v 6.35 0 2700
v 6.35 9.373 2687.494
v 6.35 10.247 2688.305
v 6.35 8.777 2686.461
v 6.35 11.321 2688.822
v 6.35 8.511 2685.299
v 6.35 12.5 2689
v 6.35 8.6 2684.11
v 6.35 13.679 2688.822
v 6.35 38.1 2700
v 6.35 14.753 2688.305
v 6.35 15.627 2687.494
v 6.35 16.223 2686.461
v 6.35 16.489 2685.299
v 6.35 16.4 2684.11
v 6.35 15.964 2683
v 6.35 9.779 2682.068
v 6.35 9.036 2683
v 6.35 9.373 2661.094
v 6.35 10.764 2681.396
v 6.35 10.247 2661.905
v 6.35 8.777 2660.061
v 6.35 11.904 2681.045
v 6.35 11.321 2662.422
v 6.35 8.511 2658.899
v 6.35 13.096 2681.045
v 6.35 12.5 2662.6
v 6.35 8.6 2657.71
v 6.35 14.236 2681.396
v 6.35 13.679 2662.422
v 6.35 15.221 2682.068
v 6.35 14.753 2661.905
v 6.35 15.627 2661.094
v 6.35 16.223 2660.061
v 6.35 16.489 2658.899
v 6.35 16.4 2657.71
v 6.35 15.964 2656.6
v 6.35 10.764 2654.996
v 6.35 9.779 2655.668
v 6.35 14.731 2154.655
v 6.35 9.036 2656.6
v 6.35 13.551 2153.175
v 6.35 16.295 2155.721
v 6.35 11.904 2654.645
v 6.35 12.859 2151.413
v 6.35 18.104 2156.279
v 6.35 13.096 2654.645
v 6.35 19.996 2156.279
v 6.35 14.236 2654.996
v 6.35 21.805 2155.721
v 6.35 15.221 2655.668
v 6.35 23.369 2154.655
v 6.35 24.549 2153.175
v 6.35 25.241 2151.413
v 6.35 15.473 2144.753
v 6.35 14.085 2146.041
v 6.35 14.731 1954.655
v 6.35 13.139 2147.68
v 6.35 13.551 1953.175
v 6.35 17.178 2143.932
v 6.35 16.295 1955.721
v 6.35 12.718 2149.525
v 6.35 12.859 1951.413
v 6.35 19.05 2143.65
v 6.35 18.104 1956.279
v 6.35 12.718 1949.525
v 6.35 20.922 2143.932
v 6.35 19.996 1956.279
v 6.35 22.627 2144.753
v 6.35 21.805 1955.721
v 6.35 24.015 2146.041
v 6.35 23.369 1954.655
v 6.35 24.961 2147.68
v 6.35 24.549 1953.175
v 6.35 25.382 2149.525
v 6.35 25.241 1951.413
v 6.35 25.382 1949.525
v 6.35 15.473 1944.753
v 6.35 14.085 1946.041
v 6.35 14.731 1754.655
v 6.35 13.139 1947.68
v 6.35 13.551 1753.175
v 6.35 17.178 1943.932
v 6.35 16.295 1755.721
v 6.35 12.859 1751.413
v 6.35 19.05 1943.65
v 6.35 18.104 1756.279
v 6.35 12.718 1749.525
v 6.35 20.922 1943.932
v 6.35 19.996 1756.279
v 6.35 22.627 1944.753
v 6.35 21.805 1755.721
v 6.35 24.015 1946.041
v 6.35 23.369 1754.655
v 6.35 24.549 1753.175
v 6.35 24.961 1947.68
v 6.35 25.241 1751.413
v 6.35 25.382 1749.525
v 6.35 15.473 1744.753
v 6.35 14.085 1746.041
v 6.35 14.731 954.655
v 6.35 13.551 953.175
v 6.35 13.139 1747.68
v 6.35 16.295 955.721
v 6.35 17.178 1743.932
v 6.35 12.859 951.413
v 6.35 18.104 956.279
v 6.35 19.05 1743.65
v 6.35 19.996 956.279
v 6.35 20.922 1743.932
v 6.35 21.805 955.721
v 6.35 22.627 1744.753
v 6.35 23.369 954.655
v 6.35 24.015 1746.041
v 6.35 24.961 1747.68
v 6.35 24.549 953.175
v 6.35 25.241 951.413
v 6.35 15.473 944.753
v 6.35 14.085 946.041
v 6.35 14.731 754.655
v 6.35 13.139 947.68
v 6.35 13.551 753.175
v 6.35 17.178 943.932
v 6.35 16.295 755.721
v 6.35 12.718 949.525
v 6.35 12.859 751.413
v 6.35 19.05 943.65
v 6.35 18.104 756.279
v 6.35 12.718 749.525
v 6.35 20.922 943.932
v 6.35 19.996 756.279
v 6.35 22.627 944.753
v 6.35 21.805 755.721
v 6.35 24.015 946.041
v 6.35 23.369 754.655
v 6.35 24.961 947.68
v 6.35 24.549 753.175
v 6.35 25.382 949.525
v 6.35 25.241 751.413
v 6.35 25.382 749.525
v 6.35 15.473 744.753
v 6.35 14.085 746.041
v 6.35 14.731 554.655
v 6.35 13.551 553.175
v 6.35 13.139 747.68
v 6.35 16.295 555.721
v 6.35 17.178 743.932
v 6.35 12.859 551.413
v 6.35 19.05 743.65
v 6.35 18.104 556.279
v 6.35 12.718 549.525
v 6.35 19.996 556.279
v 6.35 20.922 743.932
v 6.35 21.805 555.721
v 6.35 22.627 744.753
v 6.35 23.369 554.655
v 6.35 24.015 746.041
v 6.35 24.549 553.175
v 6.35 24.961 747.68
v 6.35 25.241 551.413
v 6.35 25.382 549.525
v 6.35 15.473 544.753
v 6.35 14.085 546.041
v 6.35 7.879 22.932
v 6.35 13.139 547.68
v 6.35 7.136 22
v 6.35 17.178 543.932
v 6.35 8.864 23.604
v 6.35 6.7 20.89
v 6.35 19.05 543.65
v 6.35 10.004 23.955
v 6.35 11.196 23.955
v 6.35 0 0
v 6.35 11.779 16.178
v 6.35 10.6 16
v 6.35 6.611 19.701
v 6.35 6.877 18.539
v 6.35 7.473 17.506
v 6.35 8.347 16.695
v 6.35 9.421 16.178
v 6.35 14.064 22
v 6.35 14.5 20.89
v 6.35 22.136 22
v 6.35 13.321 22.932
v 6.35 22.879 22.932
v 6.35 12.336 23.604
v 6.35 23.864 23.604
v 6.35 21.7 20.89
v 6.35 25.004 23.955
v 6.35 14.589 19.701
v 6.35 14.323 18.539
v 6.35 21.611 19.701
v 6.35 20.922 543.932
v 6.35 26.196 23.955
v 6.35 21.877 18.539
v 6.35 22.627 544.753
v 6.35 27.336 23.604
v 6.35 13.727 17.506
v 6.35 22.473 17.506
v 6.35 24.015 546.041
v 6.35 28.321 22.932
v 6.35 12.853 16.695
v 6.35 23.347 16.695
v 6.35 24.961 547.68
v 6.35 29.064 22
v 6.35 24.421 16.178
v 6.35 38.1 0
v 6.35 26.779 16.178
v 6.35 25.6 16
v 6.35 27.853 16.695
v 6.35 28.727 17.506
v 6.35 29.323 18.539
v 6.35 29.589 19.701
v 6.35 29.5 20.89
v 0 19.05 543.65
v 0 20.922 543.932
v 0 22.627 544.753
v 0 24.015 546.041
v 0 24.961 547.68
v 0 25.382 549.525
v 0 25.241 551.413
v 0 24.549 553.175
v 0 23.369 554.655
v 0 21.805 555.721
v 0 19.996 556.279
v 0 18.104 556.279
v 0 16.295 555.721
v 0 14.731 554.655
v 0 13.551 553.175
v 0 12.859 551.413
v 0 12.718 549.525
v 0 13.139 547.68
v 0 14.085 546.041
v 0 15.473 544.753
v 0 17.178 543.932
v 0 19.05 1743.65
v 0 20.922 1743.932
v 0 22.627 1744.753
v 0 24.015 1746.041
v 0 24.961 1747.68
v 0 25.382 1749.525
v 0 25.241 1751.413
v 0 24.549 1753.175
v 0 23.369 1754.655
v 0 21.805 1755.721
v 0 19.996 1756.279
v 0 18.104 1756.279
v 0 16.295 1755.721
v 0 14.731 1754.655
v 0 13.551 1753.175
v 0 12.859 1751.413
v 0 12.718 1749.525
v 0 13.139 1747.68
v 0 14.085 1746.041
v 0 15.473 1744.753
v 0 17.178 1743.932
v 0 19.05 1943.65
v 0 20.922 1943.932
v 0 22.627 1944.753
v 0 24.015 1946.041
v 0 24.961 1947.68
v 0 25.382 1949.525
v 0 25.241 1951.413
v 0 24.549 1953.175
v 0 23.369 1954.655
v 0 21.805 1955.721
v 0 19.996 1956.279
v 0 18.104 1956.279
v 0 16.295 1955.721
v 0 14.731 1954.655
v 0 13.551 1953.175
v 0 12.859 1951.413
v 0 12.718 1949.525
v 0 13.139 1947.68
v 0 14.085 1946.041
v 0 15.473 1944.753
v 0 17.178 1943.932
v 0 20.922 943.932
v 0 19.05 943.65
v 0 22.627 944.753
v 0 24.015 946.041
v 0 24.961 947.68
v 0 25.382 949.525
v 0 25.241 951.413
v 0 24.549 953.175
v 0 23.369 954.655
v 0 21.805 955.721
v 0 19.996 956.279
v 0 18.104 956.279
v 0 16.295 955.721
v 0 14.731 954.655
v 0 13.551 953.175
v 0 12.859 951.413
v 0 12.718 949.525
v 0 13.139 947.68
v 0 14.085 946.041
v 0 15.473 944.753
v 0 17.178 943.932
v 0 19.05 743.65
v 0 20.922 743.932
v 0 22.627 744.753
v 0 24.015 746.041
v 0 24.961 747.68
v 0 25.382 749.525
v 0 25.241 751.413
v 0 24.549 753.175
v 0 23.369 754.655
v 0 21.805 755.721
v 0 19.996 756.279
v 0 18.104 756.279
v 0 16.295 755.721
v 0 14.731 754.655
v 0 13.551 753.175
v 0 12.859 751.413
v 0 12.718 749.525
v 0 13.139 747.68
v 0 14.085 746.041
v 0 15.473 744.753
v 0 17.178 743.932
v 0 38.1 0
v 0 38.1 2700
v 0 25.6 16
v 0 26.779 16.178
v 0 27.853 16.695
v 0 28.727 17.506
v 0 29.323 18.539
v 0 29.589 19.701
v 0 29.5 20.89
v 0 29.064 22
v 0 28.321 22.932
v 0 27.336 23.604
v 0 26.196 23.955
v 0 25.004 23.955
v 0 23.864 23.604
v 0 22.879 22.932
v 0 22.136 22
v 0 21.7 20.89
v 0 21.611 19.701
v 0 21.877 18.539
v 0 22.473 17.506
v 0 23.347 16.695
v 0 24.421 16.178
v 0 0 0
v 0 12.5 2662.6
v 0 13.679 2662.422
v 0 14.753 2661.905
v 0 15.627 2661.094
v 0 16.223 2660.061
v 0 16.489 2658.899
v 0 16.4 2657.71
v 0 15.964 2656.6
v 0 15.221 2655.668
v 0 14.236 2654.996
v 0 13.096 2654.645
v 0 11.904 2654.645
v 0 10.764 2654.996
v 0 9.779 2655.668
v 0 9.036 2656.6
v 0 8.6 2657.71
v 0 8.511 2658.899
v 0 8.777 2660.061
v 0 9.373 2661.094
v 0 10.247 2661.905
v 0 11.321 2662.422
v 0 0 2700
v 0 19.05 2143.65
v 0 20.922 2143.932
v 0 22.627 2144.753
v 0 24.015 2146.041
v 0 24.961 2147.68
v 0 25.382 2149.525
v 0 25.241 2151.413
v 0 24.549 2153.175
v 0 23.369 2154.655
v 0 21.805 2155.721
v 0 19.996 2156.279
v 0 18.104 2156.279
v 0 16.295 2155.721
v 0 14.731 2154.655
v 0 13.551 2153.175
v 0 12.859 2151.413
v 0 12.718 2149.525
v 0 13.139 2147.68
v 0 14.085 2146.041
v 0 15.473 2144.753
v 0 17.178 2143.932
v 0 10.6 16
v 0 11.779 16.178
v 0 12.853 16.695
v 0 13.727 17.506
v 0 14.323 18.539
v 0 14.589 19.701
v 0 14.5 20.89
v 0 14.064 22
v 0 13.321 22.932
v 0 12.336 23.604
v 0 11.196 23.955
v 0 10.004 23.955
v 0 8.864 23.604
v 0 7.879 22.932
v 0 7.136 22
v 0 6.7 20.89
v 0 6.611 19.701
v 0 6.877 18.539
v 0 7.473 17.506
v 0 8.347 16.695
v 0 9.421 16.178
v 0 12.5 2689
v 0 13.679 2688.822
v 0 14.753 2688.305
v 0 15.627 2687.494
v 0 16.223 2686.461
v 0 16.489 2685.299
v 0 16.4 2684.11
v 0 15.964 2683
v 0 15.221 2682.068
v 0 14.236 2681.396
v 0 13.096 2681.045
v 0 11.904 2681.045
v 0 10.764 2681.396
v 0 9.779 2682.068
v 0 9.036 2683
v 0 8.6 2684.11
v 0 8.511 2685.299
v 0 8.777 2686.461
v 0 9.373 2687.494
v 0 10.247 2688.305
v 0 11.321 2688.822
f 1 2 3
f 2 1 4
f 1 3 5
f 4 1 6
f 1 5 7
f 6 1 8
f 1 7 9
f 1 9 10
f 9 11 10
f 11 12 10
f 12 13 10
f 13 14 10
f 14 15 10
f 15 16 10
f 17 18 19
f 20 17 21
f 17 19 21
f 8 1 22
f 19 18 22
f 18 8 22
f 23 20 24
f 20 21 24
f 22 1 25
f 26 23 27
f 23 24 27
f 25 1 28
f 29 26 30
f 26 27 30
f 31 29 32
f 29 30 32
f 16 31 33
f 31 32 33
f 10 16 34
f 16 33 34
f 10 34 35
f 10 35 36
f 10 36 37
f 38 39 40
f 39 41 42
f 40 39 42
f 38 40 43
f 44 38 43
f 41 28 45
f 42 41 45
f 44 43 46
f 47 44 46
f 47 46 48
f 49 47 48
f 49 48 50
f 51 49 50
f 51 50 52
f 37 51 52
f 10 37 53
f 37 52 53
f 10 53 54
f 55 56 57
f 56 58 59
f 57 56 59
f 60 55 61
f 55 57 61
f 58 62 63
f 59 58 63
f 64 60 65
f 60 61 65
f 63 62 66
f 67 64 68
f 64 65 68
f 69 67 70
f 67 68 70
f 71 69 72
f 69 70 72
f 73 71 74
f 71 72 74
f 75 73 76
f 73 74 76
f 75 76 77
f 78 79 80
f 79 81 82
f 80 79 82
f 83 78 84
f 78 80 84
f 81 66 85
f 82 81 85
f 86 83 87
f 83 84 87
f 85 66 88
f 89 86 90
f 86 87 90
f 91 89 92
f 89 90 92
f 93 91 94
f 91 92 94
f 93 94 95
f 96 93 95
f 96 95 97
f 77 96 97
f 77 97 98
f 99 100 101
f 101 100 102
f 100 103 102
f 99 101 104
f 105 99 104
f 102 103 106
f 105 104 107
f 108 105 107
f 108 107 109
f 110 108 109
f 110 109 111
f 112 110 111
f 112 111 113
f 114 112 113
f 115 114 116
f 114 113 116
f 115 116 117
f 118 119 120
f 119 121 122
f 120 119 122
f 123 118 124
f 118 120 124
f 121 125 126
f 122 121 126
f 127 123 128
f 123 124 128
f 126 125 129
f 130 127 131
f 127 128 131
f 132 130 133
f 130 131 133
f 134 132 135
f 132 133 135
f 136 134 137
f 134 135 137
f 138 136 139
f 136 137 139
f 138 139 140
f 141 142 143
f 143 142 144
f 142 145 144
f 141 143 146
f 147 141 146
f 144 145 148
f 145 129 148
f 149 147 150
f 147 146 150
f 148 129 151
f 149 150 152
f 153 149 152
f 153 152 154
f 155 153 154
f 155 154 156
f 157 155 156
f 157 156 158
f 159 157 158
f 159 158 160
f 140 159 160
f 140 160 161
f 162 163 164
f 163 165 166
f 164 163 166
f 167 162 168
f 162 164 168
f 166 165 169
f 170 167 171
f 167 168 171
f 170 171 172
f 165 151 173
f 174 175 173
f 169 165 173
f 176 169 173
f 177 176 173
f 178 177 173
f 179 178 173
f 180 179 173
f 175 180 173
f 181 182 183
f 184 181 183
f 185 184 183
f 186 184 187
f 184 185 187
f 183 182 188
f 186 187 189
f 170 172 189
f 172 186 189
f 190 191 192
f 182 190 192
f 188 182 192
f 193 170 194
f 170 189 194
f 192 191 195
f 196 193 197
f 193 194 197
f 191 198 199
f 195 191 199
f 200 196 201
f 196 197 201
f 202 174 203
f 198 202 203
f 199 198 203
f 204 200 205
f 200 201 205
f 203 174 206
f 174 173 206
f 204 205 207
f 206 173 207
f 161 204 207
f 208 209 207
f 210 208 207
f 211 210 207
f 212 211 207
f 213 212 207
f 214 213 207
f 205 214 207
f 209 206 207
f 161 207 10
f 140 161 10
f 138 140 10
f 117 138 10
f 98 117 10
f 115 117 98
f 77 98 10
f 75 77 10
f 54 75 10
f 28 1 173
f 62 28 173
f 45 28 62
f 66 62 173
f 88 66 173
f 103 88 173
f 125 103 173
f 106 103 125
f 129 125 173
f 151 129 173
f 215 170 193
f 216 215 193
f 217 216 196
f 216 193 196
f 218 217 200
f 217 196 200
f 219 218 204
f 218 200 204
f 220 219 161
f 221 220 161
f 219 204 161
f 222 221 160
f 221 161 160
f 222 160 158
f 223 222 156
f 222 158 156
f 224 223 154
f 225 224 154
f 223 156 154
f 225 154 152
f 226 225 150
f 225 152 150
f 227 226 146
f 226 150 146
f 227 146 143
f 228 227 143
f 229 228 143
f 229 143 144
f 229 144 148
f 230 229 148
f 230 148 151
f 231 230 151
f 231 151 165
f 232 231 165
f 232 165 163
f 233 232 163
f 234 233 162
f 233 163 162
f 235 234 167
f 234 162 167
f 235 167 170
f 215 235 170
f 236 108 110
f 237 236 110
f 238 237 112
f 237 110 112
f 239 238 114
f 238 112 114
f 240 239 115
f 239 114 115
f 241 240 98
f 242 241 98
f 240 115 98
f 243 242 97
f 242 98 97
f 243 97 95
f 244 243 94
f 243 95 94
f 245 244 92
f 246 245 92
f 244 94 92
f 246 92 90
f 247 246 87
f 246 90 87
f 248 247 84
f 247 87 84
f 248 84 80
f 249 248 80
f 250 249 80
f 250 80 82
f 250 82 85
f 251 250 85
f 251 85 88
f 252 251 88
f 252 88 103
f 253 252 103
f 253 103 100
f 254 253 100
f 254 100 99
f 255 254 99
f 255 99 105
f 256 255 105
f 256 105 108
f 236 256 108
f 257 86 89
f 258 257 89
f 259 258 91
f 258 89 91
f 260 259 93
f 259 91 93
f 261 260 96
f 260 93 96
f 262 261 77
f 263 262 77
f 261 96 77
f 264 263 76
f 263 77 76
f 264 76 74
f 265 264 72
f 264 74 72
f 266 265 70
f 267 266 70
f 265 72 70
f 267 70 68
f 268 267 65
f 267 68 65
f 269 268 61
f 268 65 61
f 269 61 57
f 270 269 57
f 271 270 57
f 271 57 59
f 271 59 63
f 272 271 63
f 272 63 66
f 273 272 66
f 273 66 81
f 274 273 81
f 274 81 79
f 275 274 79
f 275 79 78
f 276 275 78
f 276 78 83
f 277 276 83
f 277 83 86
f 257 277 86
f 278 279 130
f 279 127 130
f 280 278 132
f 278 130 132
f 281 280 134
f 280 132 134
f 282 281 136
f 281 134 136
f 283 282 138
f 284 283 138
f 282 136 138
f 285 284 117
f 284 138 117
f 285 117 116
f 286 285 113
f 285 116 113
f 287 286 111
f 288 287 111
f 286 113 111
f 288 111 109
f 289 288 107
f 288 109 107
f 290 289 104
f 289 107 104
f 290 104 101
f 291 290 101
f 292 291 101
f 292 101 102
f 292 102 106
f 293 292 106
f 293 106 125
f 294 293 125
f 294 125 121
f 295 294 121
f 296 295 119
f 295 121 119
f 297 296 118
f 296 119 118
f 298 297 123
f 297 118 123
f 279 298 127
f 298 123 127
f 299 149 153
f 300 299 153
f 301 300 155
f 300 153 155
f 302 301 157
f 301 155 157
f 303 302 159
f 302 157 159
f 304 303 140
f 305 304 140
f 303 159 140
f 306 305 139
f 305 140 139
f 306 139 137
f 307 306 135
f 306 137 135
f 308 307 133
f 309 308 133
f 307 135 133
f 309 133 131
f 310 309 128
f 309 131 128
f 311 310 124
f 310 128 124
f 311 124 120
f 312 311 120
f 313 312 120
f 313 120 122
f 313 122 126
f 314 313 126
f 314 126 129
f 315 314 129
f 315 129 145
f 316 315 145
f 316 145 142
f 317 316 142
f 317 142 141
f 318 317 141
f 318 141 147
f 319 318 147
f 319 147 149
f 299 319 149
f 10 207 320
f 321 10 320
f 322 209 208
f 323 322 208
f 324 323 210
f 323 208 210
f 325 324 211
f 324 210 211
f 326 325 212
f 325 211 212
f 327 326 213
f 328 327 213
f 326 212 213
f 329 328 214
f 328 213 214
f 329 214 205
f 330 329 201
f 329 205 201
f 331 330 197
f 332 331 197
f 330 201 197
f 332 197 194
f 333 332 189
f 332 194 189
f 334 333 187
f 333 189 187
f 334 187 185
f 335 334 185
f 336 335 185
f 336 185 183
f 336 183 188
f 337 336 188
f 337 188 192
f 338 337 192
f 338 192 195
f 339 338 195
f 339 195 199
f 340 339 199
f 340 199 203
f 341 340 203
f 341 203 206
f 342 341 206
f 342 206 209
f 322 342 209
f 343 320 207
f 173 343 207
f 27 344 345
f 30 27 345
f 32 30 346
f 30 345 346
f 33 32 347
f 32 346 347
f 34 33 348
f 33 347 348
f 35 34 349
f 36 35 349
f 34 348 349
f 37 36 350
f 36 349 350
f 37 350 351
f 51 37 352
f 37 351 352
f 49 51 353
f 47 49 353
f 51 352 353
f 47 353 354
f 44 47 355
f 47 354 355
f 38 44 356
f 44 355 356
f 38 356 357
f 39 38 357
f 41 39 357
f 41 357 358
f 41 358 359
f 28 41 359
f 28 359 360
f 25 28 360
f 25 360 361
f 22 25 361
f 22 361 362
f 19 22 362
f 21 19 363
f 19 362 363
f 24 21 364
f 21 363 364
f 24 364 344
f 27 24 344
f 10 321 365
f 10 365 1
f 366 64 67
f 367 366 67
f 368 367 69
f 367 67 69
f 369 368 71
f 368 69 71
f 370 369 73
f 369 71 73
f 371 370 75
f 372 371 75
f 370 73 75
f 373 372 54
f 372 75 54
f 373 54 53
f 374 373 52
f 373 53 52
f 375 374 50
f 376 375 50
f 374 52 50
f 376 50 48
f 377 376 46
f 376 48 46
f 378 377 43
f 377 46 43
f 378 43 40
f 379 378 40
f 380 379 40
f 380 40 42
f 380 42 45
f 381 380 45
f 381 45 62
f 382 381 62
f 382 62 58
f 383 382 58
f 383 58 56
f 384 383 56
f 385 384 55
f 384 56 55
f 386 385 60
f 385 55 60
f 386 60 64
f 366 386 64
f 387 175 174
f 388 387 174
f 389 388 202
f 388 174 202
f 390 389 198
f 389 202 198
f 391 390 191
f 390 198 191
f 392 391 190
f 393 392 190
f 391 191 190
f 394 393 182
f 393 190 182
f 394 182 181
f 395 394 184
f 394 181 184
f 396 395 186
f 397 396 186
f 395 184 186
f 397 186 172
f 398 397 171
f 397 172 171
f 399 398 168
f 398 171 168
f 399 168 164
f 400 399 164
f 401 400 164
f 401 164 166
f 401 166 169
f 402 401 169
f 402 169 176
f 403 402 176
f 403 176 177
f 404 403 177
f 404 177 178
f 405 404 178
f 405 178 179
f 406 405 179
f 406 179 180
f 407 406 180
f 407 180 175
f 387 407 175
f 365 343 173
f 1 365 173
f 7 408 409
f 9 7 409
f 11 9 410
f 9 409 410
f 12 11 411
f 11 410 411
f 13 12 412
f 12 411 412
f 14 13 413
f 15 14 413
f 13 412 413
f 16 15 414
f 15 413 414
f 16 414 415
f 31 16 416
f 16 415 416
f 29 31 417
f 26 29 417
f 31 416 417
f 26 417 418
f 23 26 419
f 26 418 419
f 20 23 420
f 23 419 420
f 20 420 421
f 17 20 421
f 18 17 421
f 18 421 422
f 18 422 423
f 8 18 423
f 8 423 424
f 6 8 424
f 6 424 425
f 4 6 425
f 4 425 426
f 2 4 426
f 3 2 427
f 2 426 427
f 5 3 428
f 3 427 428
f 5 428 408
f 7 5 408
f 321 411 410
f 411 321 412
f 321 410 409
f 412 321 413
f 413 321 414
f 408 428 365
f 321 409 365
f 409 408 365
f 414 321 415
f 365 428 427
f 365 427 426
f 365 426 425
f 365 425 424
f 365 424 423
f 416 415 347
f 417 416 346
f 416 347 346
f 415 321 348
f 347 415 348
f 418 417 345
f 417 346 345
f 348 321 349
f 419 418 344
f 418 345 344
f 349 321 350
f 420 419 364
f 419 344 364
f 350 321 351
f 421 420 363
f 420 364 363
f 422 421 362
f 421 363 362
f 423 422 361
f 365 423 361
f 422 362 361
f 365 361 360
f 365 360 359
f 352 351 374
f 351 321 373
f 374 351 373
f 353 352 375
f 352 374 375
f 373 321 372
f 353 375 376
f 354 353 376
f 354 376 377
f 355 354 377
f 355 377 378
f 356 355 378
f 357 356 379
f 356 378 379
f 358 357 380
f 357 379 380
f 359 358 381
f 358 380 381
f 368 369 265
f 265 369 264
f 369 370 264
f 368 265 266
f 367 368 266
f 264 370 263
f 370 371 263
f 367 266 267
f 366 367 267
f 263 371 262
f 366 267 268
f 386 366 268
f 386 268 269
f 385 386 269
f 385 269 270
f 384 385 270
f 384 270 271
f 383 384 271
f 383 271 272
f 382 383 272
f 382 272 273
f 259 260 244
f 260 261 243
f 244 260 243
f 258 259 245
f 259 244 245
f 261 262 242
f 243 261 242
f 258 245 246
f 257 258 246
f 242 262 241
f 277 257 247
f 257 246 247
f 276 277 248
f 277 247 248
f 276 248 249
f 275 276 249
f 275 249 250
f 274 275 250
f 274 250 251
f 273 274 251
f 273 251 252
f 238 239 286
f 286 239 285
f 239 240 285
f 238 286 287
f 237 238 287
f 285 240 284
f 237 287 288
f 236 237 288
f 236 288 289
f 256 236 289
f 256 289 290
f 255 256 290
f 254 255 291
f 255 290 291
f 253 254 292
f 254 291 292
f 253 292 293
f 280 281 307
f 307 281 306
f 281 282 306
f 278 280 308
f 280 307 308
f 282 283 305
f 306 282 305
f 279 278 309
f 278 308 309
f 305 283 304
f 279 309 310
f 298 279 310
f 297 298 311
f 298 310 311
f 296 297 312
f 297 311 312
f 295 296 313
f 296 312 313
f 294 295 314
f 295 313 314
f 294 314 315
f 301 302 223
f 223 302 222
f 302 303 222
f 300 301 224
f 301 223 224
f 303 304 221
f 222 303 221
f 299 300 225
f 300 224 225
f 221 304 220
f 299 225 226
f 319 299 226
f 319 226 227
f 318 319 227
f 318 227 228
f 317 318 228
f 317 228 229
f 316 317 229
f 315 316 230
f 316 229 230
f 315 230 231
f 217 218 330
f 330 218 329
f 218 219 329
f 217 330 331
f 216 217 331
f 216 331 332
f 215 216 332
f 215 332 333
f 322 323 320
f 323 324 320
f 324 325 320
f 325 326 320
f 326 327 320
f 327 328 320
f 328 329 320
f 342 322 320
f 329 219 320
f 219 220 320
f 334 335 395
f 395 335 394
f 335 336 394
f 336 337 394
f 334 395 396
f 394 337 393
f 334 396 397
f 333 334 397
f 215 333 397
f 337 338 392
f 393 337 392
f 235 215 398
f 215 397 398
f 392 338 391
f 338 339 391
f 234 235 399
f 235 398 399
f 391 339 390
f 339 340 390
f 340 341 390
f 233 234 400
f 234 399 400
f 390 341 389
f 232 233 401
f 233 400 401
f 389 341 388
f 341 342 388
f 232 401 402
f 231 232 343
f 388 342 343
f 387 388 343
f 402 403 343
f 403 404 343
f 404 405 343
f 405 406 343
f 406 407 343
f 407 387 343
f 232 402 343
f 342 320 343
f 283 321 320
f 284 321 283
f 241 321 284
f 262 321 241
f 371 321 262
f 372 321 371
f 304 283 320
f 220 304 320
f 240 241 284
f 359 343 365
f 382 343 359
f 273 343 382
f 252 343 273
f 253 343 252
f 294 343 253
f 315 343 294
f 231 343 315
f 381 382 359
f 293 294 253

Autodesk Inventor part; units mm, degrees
ref_plane "YZ Plane" through (0, 0, 0) normal (1, 0, 0) x (0, 1, 0)
ref_plane "XZ Plane" through (0, 0, 0) normal (0, 1, 0) x (-1, 0, 0)
ref_plane "XY Plane" through (0, 0, 0) normal (0, 0, 1) x (1, 0, 0)
sketch "Sketch1" plane through (0, 0, 0) normal (0, 0, 1) x (1, 0, 0)
  line L0 (0, 0) -> (6.35, 0)
  line L1 (6.35, 0) -> (6.35, 38.1)
  line L2 (6.35, 38.1) -> (0, 38.1)
  line L3 (0, 38.1) -> (0, 0)
  dimension "d0" = 6.35
  dimension "d1" = 38.1
extrude "Extrusion1" add sketch "Sketch1" along normal blind 2700
sketch "Sketch2" plane through (6.35, 38.1, 2700) normal (1, 0, 0) x (0, 0, -1)
  line L0 (2700, -38.1) -> (2700, 0) projected
  line L1 (2700, 0) -> (0, 0) projected
  line L2 (0, -38.1) -> (0, 0) projected
  line L3 (2700, -38.1) -> (0, -38.1) projected
  circle A0 centre (550, -19.05) radius 6.35
  circle A1 centre (750, -19.05) radius 6.35
  circle A2 centre (950, -19.05) radius 6.35
  circle A3 centre (1750, -19.05) radius 6.35
  circle A4 centre (1950, -19.05) radius 6.35
  circle A5 centre (2150, -19.05) radius 6.35
  dimension "d4" = 12.7
  dimension "d5" = 19.05
  dimension "d6" = 12.7
  dimension "d7" = 12.7
  dimension "d8" = 12.7
  dimension "d9" = 12.7
  dimension "d10" = 12.7
  dimension "d11" = 550
  dimension "d12" = 200
  dimension "d13" = 200
  dimension "d14" = 550
  dimension "d15" = 200
  dimension "d16" = 200
  dimension "d17" = 19.05
  dimension "d18" = 19.05
  dimension "d19" = 19.05
  dimension "d20" = 19.05
  dimension "d21" = 19.05
extrude "Extrusion3" cut sketch "Sketch2" against normal blind 10 contours A0 | A1 | A2 | A3 | A4 | A5
sketch "Sketch3" plane through (0, 0, 0) normal (-1, 0, 0) x (0, 0, 1)
  circle A0 centre (750, 19.05) radius 6.35 projected
  circle A1 centre (1750, 19.05) radius 6.35 projected
  circle A2 centre (2150, 19.05) radius 6.35 projected
  circle A3 centre (1950, 19.05) radius 6.35 projected
  circle A4 centre (950, 19.05) radius 6.35 projected
  circle A5 centre (550, 19.05) radius 6.35 projected
  line L0 (0, 38.1) -> (0, 0) projected
  line L1 (0, 0) -> (2700, 0) projected
  line L2 (2700, 38.1) -> (2700, 0) projected
  line L3 (0, 38.1) -> (2700, 38.1) projected
  circle A6 centre (2658.6, 12.5) radius 4
  circle A7 centre (2685, 12.5) radius 4
  dimension "d26" = 8
  dimension "d27" = 8
  dimension "d30" = 15
  dimension "d31" = 26.4
  dimension "d59" = 12.5
  dimension "d60" = 12.5
extrude "Extrusion4" cut sketch "Sketch3" against normal blind 10 contours A6 | A7
sketch "Sketch5" plane through (6.35, 38.1, 2700) normal (1, 0, 0) x (0, 0, -1)
  circle A0 centre (2680, -12.5) radius 4
  circle A1 centre (2680, -27.5) radius 4
  circle A2 centre (41.4, -25.6) radius 4 projected
  circle A3 centre (15, -25.6) radius 4 projected
  circle A4 centre (1950, -19.05) radius 6.35 projected
  circle A5 centre (950, -19.05) radius 6.35 projected
  circle A6 centre (550, -19.05) radius 6.35 projected
  circle A7 centre (750, -19.05) radius 6.35 projected
  circle A8 centre (1750, -19.05) radius 6.35 projected
  circle A9 centre (2150, -19.05) radius 6.35 projected
  line L0 (2700, -38.1) -> (2700, 0) projected
  line L1 (2700, 0) -> (0, 0) projected
  line L2 (0, -38.1) -> (0, 0) projected
  line L3 (2700, -38.1) -> (0, -38.1) projected
  dimension "d49" = 8
  dimension "d50" = 8
  dimension "d51" = 20
  dimension "d52" = 20
  dimension "d53" = 12.5
  dimension "d54" = 15
extrude "Extrusion6" cut sketch "Sketch5" against normal up to next contours A0 | A1
properties part number "X_Rai-SquareBar-Rev3" material "Iron, Ductile"
